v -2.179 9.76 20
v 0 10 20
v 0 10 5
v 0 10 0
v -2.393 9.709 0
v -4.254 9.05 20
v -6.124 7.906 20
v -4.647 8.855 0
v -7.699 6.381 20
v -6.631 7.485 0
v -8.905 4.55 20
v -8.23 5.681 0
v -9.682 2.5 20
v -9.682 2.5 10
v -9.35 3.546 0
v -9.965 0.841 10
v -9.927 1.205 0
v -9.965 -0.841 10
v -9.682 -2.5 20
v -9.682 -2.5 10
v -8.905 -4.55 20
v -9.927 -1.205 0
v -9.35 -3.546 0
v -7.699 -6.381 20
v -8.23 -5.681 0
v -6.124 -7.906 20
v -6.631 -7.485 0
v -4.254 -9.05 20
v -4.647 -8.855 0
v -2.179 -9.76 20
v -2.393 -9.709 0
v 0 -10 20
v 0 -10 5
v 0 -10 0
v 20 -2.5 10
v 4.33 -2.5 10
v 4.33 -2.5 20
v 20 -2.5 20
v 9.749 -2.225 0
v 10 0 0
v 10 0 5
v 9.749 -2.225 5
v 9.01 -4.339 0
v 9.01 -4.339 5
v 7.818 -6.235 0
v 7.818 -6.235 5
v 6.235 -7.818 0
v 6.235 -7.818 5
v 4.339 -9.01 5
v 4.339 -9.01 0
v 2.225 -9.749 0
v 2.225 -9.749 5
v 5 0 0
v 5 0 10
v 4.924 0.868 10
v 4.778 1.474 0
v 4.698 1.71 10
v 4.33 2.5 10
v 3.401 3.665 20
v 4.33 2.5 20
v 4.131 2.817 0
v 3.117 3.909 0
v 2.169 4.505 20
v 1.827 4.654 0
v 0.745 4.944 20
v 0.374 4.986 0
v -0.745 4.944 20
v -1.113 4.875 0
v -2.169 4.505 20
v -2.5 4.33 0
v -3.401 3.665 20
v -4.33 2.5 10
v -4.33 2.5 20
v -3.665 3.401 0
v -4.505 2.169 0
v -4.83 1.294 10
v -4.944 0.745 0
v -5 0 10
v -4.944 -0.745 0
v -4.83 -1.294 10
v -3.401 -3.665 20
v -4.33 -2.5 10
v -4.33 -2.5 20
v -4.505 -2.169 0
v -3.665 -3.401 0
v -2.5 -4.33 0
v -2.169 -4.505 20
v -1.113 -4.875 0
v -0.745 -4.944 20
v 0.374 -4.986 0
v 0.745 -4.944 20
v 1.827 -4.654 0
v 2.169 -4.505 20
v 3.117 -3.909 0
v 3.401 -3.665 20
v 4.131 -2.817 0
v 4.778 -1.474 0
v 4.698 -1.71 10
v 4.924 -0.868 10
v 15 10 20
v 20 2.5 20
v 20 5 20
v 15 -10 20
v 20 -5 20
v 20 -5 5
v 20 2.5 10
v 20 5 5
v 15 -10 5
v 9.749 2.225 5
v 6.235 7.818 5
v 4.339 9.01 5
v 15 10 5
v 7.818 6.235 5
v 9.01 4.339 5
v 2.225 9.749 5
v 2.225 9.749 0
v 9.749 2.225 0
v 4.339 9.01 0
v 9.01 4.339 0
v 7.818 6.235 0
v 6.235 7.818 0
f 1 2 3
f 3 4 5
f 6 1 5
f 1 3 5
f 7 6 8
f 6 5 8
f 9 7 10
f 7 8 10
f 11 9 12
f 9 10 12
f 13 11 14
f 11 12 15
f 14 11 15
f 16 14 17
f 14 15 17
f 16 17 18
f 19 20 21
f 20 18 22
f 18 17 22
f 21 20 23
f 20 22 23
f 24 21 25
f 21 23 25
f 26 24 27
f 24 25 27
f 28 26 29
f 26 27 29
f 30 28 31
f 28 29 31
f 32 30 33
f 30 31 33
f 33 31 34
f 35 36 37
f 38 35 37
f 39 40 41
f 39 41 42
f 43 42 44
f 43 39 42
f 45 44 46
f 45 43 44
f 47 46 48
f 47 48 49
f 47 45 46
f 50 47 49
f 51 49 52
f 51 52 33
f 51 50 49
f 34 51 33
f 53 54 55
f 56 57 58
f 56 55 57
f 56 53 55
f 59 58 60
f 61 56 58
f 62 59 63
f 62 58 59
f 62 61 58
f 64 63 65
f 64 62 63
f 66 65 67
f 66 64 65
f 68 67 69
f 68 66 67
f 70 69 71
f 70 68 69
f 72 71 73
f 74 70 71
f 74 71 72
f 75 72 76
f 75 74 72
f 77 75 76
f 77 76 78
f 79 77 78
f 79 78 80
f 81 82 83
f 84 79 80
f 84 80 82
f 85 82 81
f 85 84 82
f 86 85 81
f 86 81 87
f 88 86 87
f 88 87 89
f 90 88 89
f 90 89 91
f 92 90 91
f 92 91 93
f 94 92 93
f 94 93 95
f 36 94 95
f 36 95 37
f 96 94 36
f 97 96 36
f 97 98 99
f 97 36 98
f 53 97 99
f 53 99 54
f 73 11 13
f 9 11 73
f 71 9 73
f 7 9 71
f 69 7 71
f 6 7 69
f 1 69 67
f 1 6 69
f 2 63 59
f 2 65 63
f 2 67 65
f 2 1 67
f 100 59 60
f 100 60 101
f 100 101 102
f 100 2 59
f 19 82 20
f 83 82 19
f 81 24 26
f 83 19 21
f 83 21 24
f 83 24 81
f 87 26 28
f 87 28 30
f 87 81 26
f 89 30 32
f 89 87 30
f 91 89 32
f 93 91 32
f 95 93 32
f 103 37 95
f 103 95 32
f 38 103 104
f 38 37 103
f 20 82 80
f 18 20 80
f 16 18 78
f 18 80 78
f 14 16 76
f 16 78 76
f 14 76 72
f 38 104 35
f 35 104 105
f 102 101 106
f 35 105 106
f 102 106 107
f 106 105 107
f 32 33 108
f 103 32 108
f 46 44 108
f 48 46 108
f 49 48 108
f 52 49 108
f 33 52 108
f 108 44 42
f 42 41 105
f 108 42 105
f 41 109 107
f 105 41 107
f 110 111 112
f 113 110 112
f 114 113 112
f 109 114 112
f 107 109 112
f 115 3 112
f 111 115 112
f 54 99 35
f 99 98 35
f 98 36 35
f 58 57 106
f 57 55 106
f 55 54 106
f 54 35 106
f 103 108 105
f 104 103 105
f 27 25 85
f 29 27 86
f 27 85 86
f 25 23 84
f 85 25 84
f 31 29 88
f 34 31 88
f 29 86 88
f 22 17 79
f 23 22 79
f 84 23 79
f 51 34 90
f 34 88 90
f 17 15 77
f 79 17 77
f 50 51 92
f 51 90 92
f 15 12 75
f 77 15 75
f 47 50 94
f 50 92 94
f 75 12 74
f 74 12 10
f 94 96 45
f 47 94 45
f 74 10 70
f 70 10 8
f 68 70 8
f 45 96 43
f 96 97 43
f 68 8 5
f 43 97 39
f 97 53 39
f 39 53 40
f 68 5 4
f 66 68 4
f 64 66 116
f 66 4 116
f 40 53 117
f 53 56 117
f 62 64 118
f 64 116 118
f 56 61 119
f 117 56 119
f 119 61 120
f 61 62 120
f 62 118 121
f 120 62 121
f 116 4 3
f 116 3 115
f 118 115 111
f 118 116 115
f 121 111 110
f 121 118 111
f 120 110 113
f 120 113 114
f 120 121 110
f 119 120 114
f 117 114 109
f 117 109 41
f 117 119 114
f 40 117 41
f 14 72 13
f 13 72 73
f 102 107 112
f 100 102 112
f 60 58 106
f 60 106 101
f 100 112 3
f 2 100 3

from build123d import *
from build123d import SkipClean  # not in build123d's __all__

# Parameters (mm, degrees)
F0_R     = 5
F1_DEPTH = 20
F2_DEPTH = 20
F3_W     = 5
F3_H     = 10
F4_DEPTH = 30
F5_DEPTH = 5


with BuildPart() as f1:
    # F0 (on Top) → F1 (new body)
    with BuildSketch(Plane.XY):
        with BuildLine():
            ThreePointArc((0, -10), (7.0710678119, -7.0710678119), (10, 0))
            ThreePointArc((10, 0), (7.0710678119, 7.0710678119), (0, 10))
            ThreePointArc((0, 10), (-10, 0), (0, -10))
        make_face()
        Circle(F0_R, mode=Mode.SUBTRACT)
    extrude(amount=F1_DEPTH)

    # F0 (on Top) → F2 (join)
    with BuildSketch(Plane.XY):
        with BuildLine():
            ThreePointArc((0, 10), (7.0710678119, 7.0710678119), (10, 0))
            ThreePointArc((10, 0), (7.0710678119, -7.0710678119), (0, -10))
            Line((0, -10), (15, -10))
            Line((15, -10), (20, -5))
            Line((20, -5), (20, 5))
            Line((20, 5), (15, 10))
            Line((15, 10), (0, 10))
        make_face()
    extrude(amount=F2_DEPTH)

    # F3 (on face) → F4 (cut)
    with BuildSketch(Plane.YZ.offset(20)):
        with Locations((0, 15)):
            Rectangle(F3_W, F3_H)
    extrude(amount=-F4_DEPTH, mode=Mode.SUBTRACT)

    # F0 (on Top) → F5 (cut)
    with BuildSketch(Plane.XY):
        with BuildLine():
            ThreePointArc((0, 10), (7.0710678119, 7.0710678119), (10, 0))
            ThreePointArc((10, 0), (7.0710678119, -7.0710678119), (0, -10))
            Line((0, -10), (15, -10))
            Line((15, -10), (20, -5))
            Line((20, -5), (20, 5))
            Line((20, 5), (15, 10))
            Line((15, 10), (0, 10))
        make_face()
    with SkipClean():  # cleaning this boolean's faces spoils the solid; the shape is the same uncleaned
        extrude(amount=F5_DEPTH, mode=Mode.SUBTRACT)


solid = f1.part
